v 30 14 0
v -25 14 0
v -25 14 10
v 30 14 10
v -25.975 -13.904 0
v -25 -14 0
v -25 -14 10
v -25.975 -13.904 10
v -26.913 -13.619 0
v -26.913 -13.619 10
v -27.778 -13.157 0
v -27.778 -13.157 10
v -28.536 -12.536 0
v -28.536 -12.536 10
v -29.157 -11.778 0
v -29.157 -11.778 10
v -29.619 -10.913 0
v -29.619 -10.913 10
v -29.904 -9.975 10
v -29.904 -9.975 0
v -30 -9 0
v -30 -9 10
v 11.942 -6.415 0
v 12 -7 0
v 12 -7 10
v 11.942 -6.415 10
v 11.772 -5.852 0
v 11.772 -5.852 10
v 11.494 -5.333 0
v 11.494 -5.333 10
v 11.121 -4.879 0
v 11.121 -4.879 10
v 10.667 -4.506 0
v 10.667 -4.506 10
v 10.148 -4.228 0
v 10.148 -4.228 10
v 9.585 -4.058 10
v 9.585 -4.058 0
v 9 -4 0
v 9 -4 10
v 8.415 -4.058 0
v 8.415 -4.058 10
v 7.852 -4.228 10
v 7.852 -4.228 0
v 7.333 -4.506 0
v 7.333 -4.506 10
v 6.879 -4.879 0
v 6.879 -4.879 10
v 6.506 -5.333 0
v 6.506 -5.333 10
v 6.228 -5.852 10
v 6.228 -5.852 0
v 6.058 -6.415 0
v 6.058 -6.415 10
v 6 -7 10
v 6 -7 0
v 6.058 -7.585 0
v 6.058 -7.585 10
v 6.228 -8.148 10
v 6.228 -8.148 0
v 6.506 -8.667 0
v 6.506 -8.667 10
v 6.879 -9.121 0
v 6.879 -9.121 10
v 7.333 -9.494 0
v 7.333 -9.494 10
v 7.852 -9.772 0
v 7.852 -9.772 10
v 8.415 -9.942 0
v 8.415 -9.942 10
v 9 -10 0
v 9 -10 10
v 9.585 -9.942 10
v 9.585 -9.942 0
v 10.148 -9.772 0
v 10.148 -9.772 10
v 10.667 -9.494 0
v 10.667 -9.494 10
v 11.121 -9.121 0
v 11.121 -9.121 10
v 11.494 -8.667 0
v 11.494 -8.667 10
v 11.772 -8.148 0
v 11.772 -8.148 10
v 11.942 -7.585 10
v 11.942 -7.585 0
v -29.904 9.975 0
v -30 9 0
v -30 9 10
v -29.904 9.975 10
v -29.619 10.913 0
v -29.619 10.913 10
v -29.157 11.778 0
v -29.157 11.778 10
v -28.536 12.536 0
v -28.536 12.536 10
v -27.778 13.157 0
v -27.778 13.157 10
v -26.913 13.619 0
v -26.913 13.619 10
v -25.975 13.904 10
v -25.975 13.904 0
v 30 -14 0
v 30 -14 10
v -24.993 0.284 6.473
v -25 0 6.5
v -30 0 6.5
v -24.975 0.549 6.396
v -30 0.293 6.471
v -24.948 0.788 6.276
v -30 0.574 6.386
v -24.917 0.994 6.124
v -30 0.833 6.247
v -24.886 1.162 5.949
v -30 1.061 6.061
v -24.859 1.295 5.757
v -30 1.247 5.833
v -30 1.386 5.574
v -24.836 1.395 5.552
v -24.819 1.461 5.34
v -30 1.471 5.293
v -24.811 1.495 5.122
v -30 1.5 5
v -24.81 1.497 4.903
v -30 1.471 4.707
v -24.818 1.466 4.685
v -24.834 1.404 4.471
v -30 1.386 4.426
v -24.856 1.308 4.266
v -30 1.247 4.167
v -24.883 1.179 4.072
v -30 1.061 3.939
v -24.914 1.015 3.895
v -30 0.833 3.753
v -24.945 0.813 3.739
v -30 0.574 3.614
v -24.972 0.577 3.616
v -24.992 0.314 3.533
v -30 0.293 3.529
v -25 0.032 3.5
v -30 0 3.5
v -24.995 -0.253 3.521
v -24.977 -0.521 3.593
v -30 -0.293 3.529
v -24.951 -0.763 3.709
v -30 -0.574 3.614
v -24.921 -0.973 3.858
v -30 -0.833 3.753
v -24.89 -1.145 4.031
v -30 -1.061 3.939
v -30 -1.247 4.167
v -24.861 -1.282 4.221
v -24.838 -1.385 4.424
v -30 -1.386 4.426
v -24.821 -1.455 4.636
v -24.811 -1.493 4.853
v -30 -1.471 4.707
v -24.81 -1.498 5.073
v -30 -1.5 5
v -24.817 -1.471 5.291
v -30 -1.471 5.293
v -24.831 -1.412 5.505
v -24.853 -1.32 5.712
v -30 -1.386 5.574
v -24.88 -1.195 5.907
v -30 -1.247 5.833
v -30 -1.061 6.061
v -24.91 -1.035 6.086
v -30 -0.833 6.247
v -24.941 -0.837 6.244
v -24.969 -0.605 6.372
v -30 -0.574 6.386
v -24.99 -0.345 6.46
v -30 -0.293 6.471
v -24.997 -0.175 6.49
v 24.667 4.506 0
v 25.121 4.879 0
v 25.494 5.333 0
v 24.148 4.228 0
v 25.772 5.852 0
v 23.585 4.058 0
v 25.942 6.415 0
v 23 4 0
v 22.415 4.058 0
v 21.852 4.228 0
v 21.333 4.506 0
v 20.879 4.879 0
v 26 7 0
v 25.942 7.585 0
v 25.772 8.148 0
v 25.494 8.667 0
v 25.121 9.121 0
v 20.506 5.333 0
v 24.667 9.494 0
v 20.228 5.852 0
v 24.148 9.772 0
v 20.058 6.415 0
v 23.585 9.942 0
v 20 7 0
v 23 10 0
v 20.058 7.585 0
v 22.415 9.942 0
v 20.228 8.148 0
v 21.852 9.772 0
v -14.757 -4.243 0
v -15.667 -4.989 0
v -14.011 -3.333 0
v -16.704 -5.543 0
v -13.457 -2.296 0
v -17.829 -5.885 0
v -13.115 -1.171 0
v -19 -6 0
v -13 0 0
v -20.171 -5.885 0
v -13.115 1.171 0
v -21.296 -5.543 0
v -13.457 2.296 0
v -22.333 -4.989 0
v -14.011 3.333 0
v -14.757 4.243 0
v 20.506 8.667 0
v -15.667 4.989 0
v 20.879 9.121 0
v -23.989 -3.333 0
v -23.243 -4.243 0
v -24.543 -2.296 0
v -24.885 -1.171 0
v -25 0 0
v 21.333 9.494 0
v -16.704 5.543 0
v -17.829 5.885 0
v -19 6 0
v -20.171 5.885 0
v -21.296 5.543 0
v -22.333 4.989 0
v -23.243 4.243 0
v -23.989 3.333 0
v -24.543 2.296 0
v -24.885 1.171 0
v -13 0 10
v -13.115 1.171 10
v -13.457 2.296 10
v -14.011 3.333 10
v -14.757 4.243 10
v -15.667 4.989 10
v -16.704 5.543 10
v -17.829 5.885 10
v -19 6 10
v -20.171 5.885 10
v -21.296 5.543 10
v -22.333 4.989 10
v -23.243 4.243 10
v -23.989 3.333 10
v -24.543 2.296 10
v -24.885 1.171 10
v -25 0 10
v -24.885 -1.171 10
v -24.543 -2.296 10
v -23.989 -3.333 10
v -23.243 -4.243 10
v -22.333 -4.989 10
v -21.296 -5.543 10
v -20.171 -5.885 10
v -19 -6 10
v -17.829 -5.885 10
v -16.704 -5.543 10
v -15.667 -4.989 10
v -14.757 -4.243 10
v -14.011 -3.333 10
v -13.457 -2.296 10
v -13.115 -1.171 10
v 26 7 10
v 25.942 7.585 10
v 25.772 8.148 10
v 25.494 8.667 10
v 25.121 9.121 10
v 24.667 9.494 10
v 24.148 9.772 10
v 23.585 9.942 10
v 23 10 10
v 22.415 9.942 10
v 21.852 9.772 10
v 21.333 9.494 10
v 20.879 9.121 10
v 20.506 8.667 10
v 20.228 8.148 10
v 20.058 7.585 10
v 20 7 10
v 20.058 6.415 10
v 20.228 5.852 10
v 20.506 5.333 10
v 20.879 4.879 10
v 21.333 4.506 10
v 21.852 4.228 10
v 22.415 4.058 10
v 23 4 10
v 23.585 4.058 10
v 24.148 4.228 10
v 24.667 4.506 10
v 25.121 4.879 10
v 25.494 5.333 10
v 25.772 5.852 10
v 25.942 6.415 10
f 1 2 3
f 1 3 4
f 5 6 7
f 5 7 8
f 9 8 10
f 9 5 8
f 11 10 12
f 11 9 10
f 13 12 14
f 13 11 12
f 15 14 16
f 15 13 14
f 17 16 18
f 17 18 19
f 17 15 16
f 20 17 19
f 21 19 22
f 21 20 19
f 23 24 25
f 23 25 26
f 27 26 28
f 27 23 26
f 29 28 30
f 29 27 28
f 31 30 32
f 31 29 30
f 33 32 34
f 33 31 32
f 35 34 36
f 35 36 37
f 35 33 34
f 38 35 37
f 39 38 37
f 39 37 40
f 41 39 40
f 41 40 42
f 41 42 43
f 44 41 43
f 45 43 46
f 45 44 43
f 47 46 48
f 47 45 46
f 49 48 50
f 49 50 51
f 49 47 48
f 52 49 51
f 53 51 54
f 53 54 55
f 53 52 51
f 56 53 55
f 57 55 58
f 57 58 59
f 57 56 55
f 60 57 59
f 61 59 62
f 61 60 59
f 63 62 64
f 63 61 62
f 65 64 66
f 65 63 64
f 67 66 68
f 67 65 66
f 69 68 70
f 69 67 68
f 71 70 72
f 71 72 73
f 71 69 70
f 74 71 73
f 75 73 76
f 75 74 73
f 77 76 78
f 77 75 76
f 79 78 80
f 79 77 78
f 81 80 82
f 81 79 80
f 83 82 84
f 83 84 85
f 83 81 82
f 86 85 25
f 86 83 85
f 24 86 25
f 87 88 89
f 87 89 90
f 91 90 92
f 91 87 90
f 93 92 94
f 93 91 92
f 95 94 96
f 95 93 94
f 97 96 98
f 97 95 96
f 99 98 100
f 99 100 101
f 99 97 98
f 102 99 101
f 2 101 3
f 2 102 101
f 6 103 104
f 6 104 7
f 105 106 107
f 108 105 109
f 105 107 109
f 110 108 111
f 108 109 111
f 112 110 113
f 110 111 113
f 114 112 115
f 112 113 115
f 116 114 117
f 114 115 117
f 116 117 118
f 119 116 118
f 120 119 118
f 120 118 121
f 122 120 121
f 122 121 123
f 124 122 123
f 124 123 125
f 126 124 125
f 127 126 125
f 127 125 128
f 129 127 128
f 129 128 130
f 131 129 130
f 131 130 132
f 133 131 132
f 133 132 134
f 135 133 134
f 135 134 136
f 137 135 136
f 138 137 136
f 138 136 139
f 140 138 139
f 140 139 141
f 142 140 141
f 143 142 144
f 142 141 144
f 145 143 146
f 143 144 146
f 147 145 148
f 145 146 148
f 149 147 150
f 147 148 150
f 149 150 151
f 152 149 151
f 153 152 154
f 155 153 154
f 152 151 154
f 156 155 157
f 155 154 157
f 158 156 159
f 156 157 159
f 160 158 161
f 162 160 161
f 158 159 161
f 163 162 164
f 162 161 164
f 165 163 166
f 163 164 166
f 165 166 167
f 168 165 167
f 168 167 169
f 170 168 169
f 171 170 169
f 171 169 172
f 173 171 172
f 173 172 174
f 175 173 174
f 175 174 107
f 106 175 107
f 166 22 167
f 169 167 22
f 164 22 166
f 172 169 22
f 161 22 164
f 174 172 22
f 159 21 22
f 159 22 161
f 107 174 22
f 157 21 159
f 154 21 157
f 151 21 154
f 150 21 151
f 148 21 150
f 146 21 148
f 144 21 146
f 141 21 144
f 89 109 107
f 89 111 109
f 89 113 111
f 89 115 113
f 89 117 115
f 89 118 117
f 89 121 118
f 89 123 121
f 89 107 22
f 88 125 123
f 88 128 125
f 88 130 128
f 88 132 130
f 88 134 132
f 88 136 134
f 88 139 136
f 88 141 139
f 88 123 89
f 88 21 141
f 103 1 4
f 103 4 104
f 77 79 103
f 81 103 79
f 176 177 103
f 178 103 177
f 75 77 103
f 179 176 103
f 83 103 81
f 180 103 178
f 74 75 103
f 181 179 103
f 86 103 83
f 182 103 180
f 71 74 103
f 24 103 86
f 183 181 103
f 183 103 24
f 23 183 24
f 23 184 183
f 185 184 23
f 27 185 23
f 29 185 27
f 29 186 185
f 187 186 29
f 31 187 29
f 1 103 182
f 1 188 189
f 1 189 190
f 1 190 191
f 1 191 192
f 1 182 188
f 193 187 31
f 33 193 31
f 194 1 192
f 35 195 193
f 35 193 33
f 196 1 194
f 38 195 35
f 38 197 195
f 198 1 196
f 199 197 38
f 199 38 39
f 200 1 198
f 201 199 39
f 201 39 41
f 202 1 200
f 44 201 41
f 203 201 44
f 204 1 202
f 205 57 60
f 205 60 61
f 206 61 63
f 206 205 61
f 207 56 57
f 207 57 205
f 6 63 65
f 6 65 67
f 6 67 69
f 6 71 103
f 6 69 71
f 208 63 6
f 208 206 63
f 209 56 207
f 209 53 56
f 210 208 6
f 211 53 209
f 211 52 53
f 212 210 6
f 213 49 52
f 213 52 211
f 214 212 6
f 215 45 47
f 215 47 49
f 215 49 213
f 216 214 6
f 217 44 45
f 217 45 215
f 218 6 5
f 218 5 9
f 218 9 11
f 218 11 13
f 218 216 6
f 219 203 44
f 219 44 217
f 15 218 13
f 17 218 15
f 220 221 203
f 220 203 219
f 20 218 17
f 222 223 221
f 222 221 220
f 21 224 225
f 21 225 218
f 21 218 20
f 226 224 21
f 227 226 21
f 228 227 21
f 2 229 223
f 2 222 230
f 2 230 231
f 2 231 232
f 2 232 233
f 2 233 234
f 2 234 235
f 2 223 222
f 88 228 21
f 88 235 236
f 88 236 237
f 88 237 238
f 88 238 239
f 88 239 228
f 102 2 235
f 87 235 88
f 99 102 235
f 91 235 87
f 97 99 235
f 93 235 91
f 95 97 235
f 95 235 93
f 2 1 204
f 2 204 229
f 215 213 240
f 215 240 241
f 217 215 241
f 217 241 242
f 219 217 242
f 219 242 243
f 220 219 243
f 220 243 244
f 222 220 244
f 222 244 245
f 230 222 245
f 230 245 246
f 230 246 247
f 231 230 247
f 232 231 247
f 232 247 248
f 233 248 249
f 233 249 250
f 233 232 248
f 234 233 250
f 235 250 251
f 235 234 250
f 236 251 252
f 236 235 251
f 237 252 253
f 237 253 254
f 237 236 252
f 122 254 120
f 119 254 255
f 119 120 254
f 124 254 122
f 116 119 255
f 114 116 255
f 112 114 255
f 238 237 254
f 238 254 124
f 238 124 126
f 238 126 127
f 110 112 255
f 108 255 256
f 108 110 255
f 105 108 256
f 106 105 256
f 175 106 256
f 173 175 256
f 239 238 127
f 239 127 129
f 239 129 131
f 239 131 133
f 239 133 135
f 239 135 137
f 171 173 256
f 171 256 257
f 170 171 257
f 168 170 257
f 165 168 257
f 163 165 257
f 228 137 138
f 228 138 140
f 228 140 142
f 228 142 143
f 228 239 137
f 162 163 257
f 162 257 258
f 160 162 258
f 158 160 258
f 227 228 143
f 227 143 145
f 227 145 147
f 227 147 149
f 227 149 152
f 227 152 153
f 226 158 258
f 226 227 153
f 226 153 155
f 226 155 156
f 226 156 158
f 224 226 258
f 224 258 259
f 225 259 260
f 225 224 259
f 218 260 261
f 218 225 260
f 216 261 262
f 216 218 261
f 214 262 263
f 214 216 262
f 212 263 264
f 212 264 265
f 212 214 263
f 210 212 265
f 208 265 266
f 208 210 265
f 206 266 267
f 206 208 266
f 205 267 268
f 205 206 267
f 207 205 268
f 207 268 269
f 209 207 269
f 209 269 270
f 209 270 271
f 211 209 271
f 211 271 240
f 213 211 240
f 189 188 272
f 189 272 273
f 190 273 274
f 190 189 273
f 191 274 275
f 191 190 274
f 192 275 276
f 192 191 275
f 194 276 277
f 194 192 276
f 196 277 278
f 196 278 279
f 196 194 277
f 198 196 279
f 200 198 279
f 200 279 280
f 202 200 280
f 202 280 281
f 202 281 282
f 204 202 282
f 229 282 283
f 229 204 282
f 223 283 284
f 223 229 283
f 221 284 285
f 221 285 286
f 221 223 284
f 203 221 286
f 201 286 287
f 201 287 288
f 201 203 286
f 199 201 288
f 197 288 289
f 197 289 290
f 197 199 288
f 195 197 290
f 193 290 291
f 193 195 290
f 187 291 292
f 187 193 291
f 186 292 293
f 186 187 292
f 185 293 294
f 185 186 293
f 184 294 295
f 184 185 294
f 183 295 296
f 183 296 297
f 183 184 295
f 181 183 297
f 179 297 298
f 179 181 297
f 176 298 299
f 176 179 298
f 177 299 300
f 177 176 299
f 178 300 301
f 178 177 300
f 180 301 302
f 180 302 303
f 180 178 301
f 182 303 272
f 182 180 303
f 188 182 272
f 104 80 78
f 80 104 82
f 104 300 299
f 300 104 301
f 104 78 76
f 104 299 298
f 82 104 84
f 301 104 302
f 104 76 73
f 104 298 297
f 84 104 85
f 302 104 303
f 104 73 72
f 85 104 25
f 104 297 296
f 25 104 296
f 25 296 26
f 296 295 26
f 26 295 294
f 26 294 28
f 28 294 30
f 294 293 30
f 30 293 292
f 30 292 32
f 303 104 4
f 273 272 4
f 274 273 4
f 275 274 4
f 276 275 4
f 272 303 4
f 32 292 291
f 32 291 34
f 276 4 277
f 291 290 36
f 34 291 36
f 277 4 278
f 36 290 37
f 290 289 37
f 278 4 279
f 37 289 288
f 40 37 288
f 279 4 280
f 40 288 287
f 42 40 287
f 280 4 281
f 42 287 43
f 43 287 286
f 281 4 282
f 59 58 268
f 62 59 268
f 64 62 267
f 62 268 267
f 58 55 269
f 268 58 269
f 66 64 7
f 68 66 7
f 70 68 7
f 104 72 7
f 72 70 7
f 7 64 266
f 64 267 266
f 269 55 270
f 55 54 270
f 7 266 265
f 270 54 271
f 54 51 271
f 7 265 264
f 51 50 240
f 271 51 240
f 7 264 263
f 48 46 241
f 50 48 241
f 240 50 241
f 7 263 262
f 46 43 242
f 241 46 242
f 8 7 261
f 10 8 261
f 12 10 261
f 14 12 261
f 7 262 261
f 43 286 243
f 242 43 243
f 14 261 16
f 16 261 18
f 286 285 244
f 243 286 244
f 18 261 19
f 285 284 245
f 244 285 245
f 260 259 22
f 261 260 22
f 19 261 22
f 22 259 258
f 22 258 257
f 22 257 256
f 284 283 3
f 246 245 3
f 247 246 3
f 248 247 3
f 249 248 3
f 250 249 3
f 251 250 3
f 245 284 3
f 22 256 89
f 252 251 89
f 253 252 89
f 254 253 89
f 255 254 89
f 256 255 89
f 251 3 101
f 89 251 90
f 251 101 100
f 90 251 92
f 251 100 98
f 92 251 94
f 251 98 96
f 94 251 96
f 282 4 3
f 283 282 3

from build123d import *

# Parameters (mm, degrees)
IZIM1_R                     = 3
IZIM1_R_2                   = 6
Y_KSEKLIK_EKSTR_ZYON1_DEPTH = 10
KES_EKSTR_ZYON1_REACH       = 62
IZIM2_R                     = 1.5


with BuildPart() as part:
    # Çizim1 → Yükseklik-Ekstrüzyon1 (new body)
    with BuildSketch(Plane.XY):
        with BuildLine():
            Line((30, -14), (-25, -14))
            ThreePointArc((-25, -14), (-28.535533906, -12.535533906), (-30, -9))
            Line((-30, -9), (-30, 9))
            ThreePointArc((-30, 9), (-28.535533906, 12.535533906), (-25, 14))
            Line((-25, 14), (30, 14))
            Line((30, 14), (30, -14))
        make_face()
        with Locations((23, 7)):
            Circle(IZIM1_R, mode=Mode.SUBTRACT)
        with Locations((-19, 0)):
            Circle(IZIM1_R_2, mode=Mode.SUBTRACT)
        with Locations((9, -7)):
            Circle(IZIM1_R, mode=Mode.SUBTRACT)
    extrude(amount=Y_KSEKLIK_EKSTR_ZYON1_DEPTH)

    # Çizim2 → Kes-Ekstrüzyon1 (cut, up to next)
    with BuildSketch(Plane.ZY.offset(30), mode=Mode.PRIVATE) as kes_ekstr_zyon1_sk1:
        with Locations((5, 0)):
            Circle(IZIM2_R)
    kes_ekstr_zyon1_tool1 = extrude(kes_ekstr_zyon1_sk1.sketch, amount=-KES_EKSTR_ZYON1_REACH, mode=Mode.PRIVATE) & part.part
    add(kes_ekstr_zyon1_tool1.solids().sort_by_distance((-30, 0, 5))[0], mode=Mode.SUBTRACT)


solid = part.part
